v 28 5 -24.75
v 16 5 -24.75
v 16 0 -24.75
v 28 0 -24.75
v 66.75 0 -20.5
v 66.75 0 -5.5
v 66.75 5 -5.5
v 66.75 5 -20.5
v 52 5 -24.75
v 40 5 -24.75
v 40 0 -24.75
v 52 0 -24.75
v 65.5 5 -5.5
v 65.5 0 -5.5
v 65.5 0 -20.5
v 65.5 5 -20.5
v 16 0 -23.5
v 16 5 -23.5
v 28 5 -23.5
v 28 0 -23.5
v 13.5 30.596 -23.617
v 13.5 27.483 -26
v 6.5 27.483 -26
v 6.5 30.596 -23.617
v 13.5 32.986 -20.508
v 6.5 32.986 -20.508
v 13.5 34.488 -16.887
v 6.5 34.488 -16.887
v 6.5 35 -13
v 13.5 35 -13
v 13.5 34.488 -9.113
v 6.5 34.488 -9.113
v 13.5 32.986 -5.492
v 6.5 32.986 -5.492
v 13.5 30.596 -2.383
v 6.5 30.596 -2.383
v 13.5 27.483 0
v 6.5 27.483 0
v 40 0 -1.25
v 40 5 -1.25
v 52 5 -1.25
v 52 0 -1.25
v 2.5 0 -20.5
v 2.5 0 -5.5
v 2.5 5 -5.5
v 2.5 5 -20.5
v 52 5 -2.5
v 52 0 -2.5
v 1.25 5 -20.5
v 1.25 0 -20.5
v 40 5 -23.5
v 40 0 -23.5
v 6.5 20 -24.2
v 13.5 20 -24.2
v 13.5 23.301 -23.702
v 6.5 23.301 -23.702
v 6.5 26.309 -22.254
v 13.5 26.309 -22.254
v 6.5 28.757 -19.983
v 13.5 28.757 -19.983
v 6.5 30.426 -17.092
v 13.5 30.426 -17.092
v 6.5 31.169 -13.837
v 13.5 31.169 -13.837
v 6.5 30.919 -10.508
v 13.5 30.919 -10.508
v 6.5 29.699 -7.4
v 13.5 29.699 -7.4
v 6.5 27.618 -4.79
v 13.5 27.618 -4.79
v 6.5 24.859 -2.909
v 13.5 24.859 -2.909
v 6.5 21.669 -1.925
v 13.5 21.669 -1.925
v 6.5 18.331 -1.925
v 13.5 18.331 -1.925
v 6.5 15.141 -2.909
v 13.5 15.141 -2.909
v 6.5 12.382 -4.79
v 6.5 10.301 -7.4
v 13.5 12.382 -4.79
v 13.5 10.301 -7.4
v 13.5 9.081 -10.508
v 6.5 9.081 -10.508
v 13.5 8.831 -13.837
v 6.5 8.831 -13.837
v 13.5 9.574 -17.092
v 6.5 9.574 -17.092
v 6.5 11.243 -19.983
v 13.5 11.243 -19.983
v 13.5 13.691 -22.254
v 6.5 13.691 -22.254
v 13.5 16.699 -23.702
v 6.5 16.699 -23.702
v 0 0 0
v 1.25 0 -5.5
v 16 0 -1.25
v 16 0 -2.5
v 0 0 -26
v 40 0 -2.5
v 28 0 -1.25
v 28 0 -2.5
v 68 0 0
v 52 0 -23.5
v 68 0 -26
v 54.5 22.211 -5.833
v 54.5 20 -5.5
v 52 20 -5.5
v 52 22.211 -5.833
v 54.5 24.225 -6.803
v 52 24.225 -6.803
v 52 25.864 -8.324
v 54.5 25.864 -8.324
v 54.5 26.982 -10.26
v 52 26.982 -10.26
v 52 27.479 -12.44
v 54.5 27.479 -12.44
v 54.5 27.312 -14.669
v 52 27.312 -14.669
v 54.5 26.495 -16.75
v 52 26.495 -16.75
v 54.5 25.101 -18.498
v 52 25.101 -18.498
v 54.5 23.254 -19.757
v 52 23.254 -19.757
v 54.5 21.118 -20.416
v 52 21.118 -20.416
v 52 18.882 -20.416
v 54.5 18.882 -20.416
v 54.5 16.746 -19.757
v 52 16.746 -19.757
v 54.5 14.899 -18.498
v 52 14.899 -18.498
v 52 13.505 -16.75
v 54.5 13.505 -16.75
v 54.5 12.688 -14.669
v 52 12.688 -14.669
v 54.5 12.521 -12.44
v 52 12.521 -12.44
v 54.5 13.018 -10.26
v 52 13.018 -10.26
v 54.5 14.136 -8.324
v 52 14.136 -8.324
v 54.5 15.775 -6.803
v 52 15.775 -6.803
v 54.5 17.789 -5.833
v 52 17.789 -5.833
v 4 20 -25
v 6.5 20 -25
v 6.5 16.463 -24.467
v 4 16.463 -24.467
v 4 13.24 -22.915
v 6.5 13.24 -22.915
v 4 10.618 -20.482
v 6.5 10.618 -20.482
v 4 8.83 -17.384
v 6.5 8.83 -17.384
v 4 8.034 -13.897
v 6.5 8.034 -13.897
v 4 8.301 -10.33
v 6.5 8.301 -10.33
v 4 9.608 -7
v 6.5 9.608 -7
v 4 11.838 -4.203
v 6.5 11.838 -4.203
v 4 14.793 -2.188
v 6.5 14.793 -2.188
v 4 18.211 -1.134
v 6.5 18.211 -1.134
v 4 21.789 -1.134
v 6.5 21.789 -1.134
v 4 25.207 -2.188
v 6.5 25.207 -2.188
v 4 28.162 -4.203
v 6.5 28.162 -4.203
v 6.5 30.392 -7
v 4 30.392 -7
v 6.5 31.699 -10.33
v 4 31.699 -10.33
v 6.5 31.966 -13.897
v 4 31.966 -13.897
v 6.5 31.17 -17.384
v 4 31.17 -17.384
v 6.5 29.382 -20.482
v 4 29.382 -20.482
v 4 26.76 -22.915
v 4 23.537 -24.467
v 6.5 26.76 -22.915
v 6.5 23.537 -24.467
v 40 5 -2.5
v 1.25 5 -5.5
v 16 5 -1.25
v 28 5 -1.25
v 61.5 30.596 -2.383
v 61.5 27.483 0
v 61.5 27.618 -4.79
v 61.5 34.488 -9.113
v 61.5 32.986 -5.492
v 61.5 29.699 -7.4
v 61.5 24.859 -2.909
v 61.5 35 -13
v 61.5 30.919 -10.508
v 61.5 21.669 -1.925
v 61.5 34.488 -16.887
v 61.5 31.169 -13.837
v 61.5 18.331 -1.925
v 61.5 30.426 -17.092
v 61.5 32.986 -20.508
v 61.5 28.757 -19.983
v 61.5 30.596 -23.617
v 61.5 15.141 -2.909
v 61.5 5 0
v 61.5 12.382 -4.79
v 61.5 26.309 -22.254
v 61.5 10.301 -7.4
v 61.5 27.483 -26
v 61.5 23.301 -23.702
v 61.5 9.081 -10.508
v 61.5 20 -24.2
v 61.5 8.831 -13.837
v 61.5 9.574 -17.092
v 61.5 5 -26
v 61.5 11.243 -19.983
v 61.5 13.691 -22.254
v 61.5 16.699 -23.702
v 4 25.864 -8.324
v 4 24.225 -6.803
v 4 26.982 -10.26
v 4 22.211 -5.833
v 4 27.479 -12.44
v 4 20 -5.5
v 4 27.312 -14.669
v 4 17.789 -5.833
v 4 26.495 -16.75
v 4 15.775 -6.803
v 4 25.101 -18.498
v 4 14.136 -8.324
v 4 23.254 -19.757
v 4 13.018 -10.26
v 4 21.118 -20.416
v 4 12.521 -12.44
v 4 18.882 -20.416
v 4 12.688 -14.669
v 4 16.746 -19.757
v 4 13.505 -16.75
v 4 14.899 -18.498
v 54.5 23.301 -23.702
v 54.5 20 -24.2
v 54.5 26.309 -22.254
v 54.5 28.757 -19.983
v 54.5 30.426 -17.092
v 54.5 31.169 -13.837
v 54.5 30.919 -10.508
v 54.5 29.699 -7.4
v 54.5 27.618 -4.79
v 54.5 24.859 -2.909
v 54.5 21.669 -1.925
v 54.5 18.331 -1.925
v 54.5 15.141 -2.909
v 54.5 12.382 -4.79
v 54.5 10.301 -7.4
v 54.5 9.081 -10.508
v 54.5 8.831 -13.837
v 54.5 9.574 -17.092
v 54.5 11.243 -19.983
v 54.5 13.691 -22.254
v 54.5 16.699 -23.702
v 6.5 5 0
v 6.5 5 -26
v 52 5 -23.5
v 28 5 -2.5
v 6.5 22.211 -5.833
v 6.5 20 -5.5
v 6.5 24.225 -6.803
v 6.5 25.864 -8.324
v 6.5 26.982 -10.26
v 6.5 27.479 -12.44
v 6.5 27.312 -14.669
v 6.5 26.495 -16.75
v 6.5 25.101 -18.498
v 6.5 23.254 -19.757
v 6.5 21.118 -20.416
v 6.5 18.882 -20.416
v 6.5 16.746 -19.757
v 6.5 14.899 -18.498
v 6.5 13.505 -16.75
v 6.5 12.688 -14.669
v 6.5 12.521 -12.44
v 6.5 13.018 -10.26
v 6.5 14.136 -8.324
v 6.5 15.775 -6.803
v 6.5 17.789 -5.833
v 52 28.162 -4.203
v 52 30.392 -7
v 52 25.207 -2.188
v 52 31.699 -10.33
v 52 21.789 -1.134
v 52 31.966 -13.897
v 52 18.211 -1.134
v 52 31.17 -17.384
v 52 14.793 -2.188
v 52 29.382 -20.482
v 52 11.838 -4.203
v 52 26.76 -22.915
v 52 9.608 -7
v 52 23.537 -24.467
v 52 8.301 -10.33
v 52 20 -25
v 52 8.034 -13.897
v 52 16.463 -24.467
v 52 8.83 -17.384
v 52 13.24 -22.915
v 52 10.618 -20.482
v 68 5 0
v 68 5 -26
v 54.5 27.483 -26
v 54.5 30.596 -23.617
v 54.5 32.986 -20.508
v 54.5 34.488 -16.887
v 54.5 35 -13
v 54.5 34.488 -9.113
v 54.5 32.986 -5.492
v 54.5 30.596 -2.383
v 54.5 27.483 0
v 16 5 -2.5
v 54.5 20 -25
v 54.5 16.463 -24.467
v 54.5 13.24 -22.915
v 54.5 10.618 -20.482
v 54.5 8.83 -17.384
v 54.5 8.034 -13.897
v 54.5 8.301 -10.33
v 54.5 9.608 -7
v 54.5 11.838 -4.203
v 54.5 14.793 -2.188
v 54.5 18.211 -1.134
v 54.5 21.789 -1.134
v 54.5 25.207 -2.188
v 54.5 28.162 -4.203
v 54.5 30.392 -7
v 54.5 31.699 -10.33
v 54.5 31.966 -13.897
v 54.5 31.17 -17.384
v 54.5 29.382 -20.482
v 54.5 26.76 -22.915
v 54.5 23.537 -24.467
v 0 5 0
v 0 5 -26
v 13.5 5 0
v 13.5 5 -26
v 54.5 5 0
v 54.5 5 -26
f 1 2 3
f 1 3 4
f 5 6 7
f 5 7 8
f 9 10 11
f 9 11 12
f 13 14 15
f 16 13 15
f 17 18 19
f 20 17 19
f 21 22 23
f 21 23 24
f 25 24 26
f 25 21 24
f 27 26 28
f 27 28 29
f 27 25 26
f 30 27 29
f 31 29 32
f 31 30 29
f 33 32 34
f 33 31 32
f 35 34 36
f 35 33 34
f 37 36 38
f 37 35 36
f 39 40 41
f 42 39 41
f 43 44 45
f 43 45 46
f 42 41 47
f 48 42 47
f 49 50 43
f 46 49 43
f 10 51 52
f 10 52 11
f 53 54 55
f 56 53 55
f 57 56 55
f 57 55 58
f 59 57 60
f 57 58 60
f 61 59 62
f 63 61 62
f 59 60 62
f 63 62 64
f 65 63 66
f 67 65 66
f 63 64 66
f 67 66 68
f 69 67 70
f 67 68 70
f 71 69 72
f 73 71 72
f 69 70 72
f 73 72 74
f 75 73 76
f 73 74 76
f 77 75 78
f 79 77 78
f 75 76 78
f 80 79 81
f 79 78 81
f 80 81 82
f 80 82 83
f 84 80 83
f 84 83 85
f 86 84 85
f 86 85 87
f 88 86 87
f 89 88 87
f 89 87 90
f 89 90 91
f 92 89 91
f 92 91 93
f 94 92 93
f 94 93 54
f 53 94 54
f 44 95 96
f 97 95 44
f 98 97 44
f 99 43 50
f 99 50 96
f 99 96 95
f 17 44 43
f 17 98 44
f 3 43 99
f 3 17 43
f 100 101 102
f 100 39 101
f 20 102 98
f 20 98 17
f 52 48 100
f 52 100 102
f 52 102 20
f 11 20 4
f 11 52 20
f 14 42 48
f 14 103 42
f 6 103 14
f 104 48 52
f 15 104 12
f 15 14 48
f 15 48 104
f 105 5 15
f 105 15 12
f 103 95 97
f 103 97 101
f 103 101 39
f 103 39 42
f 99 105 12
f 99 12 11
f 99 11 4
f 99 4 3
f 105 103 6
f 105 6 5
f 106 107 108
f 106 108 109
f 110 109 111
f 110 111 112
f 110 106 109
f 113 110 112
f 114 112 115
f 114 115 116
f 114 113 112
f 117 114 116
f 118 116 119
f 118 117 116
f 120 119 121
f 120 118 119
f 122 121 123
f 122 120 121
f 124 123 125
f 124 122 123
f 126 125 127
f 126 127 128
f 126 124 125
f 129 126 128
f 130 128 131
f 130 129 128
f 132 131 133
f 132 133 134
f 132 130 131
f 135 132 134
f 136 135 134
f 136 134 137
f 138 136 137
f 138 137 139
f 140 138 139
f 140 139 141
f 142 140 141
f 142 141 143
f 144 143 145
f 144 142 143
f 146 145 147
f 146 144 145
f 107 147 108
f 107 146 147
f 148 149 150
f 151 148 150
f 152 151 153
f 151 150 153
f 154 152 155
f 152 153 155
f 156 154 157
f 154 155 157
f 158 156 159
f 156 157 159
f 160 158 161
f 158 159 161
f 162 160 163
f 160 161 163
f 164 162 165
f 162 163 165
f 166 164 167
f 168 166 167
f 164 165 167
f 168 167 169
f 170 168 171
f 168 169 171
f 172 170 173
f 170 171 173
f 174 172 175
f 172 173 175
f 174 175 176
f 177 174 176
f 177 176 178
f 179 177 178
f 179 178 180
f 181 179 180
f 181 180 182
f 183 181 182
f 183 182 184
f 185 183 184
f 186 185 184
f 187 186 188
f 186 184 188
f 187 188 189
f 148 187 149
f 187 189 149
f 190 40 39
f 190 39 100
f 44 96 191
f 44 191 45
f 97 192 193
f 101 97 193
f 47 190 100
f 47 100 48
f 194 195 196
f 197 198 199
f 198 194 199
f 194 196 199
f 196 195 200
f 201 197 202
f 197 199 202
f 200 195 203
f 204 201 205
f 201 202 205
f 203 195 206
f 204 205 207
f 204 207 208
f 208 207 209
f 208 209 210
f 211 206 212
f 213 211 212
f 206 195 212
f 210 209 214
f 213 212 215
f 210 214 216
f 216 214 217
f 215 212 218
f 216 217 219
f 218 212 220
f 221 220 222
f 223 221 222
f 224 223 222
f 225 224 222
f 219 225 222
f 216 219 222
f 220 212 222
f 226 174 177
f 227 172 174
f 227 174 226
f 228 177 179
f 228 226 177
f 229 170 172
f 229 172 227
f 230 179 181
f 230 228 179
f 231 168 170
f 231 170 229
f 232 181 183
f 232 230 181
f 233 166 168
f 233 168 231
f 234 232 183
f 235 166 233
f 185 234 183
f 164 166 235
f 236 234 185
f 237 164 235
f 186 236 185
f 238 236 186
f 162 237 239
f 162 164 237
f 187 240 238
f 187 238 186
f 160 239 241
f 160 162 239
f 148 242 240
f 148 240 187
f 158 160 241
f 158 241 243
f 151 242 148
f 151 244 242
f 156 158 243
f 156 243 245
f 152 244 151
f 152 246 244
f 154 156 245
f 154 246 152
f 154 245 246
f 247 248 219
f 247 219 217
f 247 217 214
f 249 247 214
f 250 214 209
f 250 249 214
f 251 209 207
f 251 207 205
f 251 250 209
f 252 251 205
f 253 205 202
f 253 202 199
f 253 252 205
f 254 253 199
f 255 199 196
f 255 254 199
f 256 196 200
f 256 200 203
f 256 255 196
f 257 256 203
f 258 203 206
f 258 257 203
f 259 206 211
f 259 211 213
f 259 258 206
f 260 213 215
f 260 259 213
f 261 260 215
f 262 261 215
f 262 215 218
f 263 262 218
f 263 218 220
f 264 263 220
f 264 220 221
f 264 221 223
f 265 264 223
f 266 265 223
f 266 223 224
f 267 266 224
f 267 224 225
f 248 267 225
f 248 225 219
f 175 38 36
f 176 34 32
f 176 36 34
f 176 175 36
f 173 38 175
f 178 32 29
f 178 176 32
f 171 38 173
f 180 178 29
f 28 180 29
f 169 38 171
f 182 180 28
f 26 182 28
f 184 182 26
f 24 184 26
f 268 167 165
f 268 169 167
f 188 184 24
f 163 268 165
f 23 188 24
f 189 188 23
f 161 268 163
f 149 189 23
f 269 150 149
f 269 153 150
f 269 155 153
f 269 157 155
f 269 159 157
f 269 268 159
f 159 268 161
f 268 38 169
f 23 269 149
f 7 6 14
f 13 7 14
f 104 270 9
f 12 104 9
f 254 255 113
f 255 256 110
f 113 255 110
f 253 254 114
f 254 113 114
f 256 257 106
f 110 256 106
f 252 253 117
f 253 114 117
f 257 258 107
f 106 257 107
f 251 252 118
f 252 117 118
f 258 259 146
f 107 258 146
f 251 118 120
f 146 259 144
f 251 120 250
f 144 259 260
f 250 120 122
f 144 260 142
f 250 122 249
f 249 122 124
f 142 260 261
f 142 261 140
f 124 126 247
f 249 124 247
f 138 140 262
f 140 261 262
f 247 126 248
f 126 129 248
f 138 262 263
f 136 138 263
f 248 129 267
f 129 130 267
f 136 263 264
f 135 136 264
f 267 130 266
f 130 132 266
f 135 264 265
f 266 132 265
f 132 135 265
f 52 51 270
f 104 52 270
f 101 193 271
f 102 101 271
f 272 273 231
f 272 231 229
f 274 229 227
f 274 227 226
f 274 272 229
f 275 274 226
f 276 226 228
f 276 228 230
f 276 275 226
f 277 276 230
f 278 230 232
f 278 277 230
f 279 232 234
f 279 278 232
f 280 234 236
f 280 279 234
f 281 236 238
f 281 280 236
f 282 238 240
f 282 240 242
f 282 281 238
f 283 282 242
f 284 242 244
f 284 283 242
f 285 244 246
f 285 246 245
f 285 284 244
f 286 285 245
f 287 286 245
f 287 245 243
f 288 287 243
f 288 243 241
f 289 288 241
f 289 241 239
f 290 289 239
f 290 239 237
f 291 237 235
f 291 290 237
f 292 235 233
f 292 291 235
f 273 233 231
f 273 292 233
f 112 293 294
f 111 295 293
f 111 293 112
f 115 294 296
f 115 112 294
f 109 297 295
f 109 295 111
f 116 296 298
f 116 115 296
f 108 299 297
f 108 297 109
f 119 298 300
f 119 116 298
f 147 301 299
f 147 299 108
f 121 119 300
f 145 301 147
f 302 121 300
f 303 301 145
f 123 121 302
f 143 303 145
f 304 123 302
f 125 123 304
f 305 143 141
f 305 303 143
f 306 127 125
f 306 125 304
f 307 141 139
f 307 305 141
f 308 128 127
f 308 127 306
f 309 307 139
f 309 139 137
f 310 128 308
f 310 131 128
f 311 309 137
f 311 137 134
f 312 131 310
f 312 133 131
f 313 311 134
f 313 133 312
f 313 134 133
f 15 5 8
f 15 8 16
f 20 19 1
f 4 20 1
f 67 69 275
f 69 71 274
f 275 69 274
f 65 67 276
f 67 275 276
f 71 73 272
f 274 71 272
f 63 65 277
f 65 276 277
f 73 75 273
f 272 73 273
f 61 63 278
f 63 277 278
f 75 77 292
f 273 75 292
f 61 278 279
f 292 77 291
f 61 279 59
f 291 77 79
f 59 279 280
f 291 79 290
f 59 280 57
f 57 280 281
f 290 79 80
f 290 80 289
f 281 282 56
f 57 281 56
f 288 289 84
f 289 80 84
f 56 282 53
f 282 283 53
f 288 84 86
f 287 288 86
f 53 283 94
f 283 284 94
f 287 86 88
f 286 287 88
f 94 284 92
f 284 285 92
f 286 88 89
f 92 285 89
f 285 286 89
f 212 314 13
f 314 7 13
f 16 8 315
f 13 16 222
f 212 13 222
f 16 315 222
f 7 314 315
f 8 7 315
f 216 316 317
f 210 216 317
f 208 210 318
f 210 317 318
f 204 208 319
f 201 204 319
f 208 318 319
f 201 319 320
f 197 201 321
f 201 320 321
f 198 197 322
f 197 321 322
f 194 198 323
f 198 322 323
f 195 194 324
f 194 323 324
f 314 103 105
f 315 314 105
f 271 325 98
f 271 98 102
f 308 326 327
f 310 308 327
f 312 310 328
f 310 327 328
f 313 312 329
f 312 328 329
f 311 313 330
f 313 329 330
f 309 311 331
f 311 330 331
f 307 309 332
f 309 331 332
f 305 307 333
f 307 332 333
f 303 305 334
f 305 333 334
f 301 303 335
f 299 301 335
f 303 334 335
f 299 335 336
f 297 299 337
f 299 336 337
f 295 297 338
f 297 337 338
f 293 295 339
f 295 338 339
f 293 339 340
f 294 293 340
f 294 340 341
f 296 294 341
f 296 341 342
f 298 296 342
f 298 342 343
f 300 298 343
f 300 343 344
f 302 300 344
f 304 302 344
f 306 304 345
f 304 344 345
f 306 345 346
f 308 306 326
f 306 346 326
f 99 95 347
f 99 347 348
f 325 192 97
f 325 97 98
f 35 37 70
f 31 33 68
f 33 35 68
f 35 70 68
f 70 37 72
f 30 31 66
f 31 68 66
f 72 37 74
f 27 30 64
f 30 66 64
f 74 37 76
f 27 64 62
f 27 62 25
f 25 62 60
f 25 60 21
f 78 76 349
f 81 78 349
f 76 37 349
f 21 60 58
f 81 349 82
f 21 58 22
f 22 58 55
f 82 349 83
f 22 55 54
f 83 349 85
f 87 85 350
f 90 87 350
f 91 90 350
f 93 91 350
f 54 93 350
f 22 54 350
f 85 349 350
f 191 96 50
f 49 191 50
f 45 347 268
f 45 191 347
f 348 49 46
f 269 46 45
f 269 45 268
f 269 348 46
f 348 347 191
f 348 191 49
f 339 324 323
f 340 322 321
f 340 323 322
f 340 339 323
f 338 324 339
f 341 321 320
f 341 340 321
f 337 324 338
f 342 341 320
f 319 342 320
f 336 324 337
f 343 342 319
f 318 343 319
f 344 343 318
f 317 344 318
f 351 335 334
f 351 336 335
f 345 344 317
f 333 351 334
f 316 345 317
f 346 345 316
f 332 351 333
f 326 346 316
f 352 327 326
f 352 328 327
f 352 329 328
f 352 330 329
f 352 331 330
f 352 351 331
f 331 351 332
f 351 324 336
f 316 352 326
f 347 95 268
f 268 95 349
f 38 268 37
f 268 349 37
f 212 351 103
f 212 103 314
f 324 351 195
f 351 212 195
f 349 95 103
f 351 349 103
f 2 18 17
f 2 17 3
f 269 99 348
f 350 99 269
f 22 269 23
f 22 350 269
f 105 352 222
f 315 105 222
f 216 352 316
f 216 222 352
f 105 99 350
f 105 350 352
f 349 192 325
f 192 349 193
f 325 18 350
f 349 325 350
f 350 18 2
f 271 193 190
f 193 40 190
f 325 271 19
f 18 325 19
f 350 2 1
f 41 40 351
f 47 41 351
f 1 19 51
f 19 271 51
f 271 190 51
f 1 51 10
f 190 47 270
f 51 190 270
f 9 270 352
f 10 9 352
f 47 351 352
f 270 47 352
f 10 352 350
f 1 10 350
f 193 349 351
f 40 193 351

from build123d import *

# Parameters (mm, degrees)
SKETCH1_W            = 20
SKETCH1_H            = 26
SKETCH1_W_2          = 1.25
SKETCH1_H_2          = 15
BOSS_EXTRUDE5_DEPTH  = 5
SKETCH3_W            = 7
SKETCH3_H            = 26
BOSS_EXTRUDE6_DEPTH  = 40
CUT_EXTRUDE1_REACH   = 55.696
SKETCH5_R            = 11.2
SKETCH6_W            = 26
SKETCH6_H            = 5
BOSS_EXTRUDE8_DEPTH  = 14
SKETCH8_R            = 12
SKETCH8_R_2          = 7.5
BOSS_EXTRUDE9_DEPTH  = 2.5
SKETCH9_R            = 12
SKETCH9_R_2          = 7.5
BOSS_EXTRUDE10_DEPTH = 2.5
SKETCH7_W            = 12
SKETCH7_H            = 1.25
CUT_EXTRUDE2_DEPTH   = 10


with BuildPart() as part:
    # Sketch1 → Boss-Extrude5 (new body)
    with BuildSketch(Plane(origin=(0, 0, 0), x_dir=(1, 0, 0), z_dir=(0, 1, 0))):
        with Locations((10, 13)):
            Rectangle(SKETCH1_W, SKETCH1_H)
        with Locations((1.875, 13)):
            Rectangle(SKETCH1_W_2, SKETCH1_H_2, mode=Mode.SUBTRACT)
    boss_extrude5 = extrude(amount=BOSS_EXTRUDE5_DEPTH)

    # Sketch3 → Boss-Extrude6 (add)
    with BuildSketch(Plane(origin=(0, 5, 0), x_dir=(1, 0, 0), z_dir=(0, 1, 0))):
        with Locations((10, 13)):
            Rectangle(SKETCH3_W, SKETCH3_H)
    boss_extrude6 = extrude(amount=BOSS_EXTRUDE6_DEPTH)

    # Sketch5 → Cut-Extrude1 (cut, up to next)
    with BuildSketch(Plane(origin=(13.5, 0, 0), x_dir=(0, 0, -1), z_dir=(1, 0, 0)), mode=Mode.PRIVATE) as cut_extrude1_sk1:
        with Locations((13, 20)):
            Circle(SKETCH5_R)
    cut_extrude1_tool1 = extrude(cut_extrude1_sk1.sketch, amount=-CUT_EXTRUDE1_REACH, mode=Mode.PRIVATE) & part.part
    # Sketch5 → Cut-Extrude1 (cut, up to next)
    with BuildSketch(Plane(origin=(13.5, 0, 0), x_dir=(0, 0, -1), z_dir=(1, 0, 0)), mode=Mode.PRIVATE) as cut_extrude1_sk2:
        with BuildLine():
            Line((0, 27.483314774), (0, 45))
            Line((0, 45), (26, 45))
            Line((26, 45), (26, 27.483314774))
            ThreePointArc((26, 27.483314774), (13, 35), (0, 27.483314774))
        make_face()
    cut_extrude1_tool2 = extrude(cut_extrude1_sk2.sketch, amount=-CUT_EXTRUDE1_REACH, mode=Mode.PRIVATE) & part.part
    cut_extrude1_1 = cut_extrude1_tool1.solids().sort_by_distance((13.5, 20, -13))[0]
    add(cut_extrude1_1, mode=Mode.SUBTRACT)
    cut_extrude1_2 = cut_extrude1_tool2.solids().sort_by_distance((13.5, 38.725293, -13))[0]
    add(cut_extrude1_2, mode=Mode.SUBTRACT)
    cut_extrude1 = cut_extrude1_1 + cut_extrude1_2  # Cut-Extrude1 as one shape, for the pattern or mirror that repeats it

    # Sketch6 → Boss-Extrude8 (add)
    with BuildSketch(Plane(origin=(20, 0, 0), x_dir=(0, 0, -1), z_dir=(1, 0, 0))):
        with Locations((13, 2.5)):
            Rectangle(SKETCH6_W, SKETCH6_H)
    boss_extrude8 = extrude(amount=BOSS_EXTRUDE8_DEPTH)

    # Mirror5: Boss-Extrude5, Boss-Extrude6, Cut-Extrude1, Boss-Extrude8 across plane
    add(boss_extrude5.mirror(Plane.ZY.offset(-34)))
    add(boss_extrude6.mirror(Plane.ZY.offset(-34)))
    add(cut_extrude1.mirror(Plane.ZY.offset(-34)), mode=Mode.SUBTRACT)
    add(boss_extrude8.mirror(Plane.ZY.offset(-34)))

    # Sketch8 → Boss-Extrude9 (add)
    with BuildSketch(Plane.ZY.offset(-6.5)):
        with Locations(Location((-13, 20, 0), (0, 0, 180))):
            Circle(SKETCH8_R)
        with Locations((-13, 20)):
            Circle(SKETCH8_R_2, mode=Mode.SUBTRACT)
    extrude(amount=BOSS_EXTRUDE9_DEPTH)

    # Sketch9 → Boss-Extrude10 (add)
    with BuildSketch(Plane.ZY.offset(-54.5)):
        with Locations(Location((-13, 20, 0), (0, 0, 180))):
            Circle(SKETCH9_R)
        with Locations((-13, 20)):
            Circle(SKETCH9_R_2, mode=Mode.SUBTRACT)
    extrude(amount=BOSS_EXTRUDE10_DEPTH)

    # Sketch7 → Cut-Extrude2 (cut)
    with BuildSketch(Plane(origin=(0, 5, 0), x_dir=(1, 0, 0), z_dir=(0, 1, 0))):
        with Locations((22, 1.875)):
            Rectangle(SKETCH7_W, SKETCH7_H)
        with Locations((46, 1.875)):
            Rectangle(SKETCH7_W, SKETCH7_H)
        with Locations((46, 24.125)):
            Rectangle(SKETCH7_W, SKETCH7_H)
        with Locations((22, 24.125)):
            Rectangle(SKETCH7_W, SKETCH7_H)
    extrude(amount=-CUT_EXTRUDE2_DEPTH, mode=Mode.SUBTRACT)


solid = part.part
